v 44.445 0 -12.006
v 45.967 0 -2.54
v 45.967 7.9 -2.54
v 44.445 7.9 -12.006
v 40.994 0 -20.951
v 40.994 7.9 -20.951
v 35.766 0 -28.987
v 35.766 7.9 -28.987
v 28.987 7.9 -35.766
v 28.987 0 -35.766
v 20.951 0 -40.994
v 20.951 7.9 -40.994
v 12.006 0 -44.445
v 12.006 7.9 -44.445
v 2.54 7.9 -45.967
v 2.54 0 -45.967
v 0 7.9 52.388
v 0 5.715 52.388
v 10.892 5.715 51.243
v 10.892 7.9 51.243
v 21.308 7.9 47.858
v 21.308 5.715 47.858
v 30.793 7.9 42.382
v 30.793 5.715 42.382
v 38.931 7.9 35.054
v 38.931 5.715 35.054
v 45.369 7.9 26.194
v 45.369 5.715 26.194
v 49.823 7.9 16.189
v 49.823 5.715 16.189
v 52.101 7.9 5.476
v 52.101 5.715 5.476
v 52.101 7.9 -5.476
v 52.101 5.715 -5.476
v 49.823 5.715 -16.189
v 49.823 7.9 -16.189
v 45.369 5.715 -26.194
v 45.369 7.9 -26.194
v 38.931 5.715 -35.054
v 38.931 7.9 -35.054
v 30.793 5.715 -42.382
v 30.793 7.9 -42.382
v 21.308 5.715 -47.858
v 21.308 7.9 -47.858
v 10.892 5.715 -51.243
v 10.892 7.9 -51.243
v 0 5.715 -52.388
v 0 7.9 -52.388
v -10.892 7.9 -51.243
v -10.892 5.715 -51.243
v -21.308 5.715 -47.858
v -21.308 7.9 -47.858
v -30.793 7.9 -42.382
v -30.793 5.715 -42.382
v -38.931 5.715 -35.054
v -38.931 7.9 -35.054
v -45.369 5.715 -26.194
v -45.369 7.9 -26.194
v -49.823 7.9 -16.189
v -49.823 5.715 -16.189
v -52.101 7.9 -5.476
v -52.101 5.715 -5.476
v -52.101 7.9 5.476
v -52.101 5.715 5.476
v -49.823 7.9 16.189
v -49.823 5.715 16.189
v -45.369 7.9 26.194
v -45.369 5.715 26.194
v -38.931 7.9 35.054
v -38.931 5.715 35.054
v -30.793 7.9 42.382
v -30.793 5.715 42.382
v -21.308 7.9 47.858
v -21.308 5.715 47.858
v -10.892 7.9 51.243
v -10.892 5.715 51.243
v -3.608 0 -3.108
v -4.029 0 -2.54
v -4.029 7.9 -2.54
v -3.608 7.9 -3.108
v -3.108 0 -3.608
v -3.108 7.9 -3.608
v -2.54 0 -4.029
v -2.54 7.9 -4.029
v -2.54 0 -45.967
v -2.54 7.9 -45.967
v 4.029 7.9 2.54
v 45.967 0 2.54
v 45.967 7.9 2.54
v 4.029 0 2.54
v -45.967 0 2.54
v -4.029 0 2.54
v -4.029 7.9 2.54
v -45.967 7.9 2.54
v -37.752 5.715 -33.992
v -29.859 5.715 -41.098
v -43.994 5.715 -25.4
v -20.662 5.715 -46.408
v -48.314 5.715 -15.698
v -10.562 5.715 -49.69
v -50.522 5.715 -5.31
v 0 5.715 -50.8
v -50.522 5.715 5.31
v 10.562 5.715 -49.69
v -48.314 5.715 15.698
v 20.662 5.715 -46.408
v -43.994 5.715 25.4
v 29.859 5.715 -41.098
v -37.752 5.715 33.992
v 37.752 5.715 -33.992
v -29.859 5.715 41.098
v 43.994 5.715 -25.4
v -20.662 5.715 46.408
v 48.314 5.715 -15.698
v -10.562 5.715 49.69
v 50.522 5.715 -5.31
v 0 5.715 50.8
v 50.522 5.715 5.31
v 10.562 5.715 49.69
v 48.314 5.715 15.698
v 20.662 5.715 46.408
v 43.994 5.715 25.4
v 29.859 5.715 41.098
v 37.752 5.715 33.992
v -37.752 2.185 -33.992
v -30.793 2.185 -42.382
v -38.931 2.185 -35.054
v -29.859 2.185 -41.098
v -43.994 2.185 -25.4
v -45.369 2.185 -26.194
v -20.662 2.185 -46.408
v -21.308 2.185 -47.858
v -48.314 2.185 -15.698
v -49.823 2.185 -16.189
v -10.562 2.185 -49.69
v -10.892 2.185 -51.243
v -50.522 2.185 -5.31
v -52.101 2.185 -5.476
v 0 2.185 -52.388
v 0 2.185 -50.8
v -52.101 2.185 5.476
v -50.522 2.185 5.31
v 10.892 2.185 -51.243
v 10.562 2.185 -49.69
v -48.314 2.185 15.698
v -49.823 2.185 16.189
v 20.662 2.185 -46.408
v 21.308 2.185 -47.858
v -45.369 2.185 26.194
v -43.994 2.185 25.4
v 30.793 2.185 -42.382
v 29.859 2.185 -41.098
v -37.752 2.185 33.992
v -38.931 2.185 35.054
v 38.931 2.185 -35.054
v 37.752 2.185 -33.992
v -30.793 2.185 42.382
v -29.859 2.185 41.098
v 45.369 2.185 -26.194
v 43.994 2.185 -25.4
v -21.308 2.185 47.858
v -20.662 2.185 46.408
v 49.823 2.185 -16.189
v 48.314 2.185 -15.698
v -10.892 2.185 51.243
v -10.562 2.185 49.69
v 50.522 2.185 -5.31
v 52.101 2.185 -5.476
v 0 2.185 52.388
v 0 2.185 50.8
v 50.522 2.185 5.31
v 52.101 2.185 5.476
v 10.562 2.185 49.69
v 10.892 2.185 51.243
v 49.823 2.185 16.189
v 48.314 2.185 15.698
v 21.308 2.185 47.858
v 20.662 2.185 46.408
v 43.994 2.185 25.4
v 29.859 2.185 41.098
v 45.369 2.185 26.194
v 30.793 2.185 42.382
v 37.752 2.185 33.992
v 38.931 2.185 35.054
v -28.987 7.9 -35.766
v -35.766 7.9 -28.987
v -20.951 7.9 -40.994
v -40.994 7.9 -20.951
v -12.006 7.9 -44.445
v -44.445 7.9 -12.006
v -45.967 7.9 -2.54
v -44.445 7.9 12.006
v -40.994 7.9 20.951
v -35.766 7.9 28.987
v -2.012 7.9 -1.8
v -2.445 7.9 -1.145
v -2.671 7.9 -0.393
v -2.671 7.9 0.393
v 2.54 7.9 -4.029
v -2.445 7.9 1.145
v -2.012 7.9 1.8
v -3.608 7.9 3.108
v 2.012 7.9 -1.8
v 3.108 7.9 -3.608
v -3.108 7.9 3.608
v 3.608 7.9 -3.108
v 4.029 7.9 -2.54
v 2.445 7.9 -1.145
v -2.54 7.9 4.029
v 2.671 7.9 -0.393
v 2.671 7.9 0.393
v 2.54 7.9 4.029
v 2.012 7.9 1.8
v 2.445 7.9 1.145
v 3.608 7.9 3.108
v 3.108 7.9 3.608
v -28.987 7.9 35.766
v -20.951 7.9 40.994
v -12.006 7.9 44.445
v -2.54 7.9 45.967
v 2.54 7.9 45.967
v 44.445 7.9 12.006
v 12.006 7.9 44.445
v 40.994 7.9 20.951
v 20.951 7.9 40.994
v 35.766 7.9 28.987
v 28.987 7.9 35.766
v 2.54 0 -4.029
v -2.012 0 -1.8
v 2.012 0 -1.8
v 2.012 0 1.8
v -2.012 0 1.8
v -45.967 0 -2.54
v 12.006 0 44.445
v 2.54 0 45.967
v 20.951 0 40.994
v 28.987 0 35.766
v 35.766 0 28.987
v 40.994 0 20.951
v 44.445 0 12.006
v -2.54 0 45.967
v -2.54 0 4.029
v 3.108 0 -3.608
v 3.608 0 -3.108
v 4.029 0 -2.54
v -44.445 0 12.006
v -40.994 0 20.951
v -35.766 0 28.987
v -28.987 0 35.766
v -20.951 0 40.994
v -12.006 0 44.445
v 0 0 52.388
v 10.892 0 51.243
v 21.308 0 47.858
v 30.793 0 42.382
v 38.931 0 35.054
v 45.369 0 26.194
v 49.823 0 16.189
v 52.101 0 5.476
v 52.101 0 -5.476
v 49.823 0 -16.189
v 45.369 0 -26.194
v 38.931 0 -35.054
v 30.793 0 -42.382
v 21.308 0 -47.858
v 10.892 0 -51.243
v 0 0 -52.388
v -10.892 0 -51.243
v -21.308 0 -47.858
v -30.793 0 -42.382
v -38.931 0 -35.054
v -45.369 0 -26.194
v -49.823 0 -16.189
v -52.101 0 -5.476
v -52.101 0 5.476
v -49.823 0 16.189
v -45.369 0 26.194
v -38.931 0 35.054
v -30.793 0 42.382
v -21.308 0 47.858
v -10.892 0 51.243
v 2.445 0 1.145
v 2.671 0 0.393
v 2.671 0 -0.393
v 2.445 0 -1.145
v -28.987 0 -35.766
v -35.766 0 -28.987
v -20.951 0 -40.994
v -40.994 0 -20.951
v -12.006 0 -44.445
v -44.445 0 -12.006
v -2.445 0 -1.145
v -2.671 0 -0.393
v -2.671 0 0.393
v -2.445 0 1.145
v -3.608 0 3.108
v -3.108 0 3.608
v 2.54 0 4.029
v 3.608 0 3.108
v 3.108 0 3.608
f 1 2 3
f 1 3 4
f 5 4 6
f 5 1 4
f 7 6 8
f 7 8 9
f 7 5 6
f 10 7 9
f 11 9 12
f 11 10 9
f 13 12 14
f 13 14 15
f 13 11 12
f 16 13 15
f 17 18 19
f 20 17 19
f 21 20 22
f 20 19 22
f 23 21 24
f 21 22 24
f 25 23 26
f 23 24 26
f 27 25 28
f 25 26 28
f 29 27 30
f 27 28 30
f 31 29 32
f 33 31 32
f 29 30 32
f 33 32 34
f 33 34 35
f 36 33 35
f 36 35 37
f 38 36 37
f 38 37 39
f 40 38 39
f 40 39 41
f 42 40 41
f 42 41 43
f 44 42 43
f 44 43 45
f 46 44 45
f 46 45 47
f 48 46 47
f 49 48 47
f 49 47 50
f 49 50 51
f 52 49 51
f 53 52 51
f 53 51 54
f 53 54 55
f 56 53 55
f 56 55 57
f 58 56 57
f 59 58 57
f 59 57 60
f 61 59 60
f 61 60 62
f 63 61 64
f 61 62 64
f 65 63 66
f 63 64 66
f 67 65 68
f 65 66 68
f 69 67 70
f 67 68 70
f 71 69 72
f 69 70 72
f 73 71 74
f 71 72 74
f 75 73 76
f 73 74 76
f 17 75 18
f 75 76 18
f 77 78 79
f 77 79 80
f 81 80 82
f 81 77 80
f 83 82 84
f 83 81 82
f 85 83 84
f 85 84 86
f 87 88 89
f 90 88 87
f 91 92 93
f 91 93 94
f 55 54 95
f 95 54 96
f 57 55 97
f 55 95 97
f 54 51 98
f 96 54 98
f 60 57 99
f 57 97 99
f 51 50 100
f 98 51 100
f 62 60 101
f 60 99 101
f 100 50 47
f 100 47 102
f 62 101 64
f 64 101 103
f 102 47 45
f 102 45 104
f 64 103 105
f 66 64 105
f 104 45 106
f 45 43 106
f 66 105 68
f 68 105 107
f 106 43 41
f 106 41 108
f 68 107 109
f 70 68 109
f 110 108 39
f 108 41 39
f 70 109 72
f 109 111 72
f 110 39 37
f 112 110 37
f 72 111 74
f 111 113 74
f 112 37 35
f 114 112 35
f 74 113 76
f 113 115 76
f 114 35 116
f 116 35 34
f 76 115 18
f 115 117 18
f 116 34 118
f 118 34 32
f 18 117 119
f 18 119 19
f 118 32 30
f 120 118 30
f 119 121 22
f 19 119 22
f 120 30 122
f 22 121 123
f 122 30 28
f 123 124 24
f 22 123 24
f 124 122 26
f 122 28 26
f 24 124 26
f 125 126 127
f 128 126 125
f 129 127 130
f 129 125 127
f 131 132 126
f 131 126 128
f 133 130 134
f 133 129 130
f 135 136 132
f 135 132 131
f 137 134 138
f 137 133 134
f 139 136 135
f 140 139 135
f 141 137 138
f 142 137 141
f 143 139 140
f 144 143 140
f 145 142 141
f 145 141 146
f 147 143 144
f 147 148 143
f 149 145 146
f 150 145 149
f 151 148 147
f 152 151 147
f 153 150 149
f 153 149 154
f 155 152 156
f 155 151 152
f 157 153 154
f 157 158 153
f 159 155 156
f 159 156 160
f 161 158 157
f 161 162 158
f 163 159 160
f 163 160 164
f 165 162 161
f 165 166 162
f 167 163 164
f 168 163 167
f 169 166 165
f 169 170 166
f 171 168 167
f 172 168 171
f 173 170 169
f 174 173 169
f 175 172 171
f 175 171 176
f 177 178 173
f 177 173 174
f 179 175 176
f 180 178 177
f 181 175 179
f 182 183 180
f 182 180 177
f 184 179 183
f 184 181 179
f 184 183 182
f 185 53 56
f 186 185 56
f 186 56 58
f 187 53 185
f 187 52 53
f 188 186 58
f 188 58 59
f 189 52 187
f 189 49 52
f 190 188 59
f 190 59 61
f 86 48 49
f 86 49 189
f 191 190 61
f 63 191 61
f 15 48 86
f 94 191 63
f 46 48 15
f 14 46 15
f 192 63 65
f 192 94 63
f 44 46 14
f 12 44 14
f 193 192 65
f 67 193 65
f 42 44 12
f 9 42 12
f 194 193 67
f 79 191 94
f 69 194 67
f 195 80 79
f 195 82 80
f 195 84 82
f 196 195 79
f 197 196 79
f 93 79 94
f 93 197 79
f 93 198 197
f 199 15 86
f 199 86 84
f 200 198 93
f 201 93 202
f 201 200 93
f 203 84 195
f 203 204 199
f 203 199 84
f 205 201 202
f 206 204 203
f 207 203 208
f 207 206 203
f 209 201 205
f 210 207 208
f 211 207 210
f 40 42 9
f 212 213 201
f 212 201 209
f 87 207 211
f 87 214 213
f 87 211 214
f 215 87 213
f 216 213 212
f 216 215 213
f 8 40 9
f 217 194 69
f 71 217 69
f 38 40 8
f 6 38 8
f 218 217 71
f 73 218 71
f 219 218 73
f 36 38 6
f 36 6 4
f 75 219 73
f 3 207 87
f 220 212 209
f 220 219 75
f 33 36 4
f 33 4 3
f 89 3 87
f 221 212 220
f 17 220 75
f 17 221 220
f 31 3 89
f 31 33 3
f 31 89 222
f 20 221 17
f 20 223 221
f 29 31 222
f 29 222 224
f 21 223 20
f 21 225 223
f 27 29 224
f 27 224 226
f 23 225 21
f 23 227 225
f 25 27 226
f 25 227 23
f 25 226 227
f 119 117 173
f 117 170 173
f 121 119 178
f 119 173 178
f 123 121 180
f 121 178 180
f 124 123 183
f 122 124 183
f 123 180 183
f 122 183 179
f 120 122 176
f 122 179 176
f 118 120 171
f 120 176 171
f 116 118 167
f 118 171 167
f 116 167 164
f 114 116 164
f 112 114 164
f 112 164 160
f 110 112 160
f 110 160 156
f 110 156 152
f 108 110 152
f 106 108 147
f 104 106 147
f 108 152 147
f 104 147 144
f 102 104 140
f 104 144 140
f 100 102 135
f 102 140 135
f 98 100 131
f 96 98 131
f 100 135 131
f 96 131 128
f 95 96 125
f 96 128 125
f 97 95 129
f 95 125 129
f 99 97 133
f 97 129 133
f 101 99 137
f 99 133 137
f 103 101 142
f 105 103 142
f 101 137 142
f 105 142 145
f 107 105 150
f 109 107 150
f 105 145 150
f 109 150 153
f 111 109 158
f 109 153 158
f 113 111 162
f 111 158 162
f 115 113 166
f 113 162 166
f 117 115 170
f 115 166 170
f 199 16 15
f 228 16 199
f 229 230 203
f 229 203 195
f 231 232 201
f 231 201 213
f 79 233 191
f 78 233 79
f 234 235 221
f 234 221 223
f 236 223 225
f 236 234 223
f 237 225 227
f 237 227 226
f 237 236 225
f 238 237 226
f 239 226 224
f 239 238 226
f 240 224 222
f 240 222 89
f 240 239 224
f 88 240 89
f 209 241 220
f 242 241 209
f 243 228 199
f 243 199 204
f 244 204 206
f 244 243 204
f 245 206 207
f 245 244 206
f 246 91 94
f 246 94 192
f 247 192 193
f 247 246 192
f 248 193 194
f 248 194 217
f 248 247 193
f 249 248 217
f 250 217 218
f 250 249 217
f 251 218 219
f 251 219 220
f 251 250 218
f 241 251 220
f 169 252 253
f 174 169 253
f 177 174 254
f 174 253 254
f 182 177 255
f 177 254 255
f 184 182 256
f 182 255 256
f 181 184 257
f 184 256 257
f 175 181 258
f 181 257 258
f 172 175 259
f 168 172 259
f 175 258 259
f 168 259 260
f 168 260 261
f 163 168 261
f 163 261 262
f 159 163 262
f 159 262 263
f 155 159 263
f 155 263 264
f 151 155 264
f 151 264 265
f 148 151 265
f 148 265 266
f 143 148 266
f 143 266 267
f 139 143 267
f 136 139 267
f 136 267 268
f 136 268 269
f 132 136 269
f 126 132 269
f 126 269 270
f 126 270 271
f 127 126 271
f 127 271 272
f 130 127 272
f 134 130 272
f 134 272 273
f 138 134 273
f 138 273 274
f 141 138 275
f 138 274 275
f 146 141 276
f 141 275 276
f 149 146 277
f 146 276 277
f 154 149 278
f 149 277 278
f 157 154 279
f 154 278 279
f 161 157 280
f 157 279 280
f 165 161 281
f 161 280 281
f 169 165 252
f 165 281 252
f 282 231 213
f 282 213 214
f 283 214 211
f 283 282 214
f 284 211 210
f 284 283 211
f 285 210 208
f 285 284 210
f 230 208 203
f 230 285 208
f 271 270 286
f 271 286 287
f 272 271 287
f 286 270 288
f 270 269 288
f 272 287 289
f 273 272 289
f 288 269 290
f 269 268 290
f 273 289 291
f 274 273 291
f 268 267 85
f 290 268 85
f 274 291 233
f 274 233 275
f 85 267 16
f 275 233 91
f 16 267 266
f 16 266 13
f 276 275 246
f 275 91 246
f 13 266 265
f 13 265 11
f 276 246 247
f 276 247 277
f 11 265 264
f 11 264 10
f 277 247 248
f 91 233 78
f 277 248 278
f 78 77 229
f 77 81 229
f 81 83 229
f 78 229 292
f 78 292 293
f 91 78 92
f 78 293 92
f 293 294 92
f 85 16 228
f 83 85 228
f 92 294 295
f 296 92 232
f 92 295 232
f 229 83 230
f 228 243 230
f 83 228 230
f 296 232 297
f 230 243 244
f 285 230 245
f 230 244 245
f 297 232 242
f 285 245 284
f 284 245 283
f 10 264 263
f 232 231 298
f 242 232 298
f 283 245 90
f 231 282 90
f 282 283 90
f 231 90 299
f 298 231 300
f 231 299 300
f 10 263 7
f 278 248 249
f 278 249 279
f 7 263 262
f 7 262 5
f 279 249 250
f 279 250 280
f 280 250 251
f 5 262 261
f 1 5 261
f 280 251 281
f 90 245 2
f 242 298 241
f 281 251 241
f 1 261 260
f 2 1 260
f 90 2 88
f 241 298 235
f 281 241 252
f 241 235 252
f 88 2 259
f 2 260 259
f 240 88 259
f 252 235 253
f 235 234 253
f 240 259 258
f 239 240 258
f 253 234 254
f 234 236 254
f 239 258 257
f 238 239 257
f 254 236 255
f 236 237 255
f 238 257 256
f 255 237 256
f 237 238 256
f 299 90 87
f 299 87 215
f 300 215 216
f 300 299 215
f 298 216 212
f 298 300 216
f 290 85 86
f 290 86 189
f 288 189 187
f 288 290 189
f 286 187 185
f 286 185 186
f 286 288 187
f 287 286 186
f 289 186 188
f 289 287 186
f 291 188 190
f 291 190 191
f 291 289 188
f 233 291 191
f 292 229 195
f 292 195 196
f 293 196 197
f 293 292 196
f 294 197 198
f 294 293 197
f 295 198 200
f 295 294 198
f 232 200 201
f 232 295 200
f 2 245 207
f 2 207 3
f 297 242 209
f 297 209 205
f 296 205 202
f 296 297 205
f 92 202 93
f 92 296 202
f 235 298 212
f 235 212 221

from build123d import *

# Parameters (mm, degrees)
SKETCH1_R           = 52.3875
SKETCH1_R_2         = 50.8
BOSS_EXTRUDE1_DEPTH = 7.9
CUT_EXTRUDE1_START  = 3.95
SKETCH1_3_R         = 52.3875
SKETCH1_3_R_2       = 50.8
CUT_EXTRUDE1_DEPTH  = 1.7653


with BuildPart() as part:
    # Sketch1 → Boss-Extrude1 (new body)
    with BuildSketch(Plane(origin=(0, 0, 0), x_dir=(1, 0, 0), z_dir=(0, 1, 0))):
        with Locations(Location((0, 0, 0), (0, 0, 270))):
            Circle(SKETCH1_R)
        Circle(SKETCH1_R_2, mode=Mode.SUBTRACT)
        Circle(SKETCH1_R_2)
        with BuildLine():
            Line((-2.54, 4.028623369), (-2.54, 45.967377631))
            ThreePointArc((-2.54, 45.967377631), (-32.553428439, 32.553428439), (-45.967377631, 2.54))
            Line((-45.967377631, 2.54), (-4.028623369, 2.54))
            ThreePointArc((-4.028623369, 2.54), (-3.367596045, 3.367596045), (-2.54, 4.028623369))
        make_face(mode=Mode.SUBTRACT)
        with BuildLine():
            Line((4.028623369, 2.54), (45.967377631, 2.54))
            ThreePointArc((45.967377631, 2.54), (32.553428439, 32.553428439), (2.54, 45.967377631))
            Line((2.54, 45.967377631), (2.54, 4.028623369))
            ThreePointArc((2.54, 4.028623369), (3.367596045, 3.367596045), (4.028623369, 2.54))
        make_face(mode=Mode.SUBTRACT)
        with BuildLine():
            Line((2.54, -4.028623369), (2.54, -45.967377631))
            ThreePointArc((2.54, -45.967377631), (32.553428439, -32.553428439), (45.967377631, -2.54))
            Line((45.967377631, -2.54), (4.028623369, -2.54))
            ThreePointArc((4.028623369, -2.54), (3.367596045, -3.367596045), (2.54, -4.028623369))
        make_face(mode=Mode.SUBTRACT)
        with BuildLine():
            ThreePointArc((2.01246118, -1.8), (2.7, 0), (2.01246118, 1.8))
            Line((2.01246118, 1.8), (-2.01246118, 1.8))
            ThreePointArc((-2.01246118, 1.8), (-2.7, 0), (-2.01246118, -1.8))
            Line((-2.01246118, -1.8), (2.01246118, -1.8))
        make_face(mode=Mode.SUBTRACT)
        with BuildLine():
            ThreePointArc((-45.967377631, -2.54), (-32.553428439, -32.553428439), (-2.54, -45.967377631))
            Line((-2.54, -45.967377631), (-2.54, -4.028623369))
            ThreePointArc((-2.54, -4.028623369), (-3.367596045, -3.367596045), (-4.028623369, -2.54))
            Line((-4.028623369, -2.54), (-45.967377631, -2.54))
        make_face(mode=Mode.SUBTRACT)
    extrude(amount=BOSS_EXTRUDE1_DEPTH)

    # Sketch1<3> → Cut-Extrude1 (cut, symmetric)
    with BuildSketch(Plane(origin=(0, 0, 0), x_dir=(1, 0, 0), z_dir=(0, 1, 0)).offset(CUT_EXTRUDE1_START)):
        with Locations(Location((0, 0, 0), (0, 0, 270))):
            Circle(SKETCH1_3_R)
        with Locations(Location((0, 0, 0), (0, 0, 270))):
            Circle(SKETCH1_3_R_2, mode=Mode.SUBTRACT)
    extrude(amount=CUT_EXTRUDE1_DEPTH, both=True, mode=Mode.SUBTRACT)


solid = part.part
